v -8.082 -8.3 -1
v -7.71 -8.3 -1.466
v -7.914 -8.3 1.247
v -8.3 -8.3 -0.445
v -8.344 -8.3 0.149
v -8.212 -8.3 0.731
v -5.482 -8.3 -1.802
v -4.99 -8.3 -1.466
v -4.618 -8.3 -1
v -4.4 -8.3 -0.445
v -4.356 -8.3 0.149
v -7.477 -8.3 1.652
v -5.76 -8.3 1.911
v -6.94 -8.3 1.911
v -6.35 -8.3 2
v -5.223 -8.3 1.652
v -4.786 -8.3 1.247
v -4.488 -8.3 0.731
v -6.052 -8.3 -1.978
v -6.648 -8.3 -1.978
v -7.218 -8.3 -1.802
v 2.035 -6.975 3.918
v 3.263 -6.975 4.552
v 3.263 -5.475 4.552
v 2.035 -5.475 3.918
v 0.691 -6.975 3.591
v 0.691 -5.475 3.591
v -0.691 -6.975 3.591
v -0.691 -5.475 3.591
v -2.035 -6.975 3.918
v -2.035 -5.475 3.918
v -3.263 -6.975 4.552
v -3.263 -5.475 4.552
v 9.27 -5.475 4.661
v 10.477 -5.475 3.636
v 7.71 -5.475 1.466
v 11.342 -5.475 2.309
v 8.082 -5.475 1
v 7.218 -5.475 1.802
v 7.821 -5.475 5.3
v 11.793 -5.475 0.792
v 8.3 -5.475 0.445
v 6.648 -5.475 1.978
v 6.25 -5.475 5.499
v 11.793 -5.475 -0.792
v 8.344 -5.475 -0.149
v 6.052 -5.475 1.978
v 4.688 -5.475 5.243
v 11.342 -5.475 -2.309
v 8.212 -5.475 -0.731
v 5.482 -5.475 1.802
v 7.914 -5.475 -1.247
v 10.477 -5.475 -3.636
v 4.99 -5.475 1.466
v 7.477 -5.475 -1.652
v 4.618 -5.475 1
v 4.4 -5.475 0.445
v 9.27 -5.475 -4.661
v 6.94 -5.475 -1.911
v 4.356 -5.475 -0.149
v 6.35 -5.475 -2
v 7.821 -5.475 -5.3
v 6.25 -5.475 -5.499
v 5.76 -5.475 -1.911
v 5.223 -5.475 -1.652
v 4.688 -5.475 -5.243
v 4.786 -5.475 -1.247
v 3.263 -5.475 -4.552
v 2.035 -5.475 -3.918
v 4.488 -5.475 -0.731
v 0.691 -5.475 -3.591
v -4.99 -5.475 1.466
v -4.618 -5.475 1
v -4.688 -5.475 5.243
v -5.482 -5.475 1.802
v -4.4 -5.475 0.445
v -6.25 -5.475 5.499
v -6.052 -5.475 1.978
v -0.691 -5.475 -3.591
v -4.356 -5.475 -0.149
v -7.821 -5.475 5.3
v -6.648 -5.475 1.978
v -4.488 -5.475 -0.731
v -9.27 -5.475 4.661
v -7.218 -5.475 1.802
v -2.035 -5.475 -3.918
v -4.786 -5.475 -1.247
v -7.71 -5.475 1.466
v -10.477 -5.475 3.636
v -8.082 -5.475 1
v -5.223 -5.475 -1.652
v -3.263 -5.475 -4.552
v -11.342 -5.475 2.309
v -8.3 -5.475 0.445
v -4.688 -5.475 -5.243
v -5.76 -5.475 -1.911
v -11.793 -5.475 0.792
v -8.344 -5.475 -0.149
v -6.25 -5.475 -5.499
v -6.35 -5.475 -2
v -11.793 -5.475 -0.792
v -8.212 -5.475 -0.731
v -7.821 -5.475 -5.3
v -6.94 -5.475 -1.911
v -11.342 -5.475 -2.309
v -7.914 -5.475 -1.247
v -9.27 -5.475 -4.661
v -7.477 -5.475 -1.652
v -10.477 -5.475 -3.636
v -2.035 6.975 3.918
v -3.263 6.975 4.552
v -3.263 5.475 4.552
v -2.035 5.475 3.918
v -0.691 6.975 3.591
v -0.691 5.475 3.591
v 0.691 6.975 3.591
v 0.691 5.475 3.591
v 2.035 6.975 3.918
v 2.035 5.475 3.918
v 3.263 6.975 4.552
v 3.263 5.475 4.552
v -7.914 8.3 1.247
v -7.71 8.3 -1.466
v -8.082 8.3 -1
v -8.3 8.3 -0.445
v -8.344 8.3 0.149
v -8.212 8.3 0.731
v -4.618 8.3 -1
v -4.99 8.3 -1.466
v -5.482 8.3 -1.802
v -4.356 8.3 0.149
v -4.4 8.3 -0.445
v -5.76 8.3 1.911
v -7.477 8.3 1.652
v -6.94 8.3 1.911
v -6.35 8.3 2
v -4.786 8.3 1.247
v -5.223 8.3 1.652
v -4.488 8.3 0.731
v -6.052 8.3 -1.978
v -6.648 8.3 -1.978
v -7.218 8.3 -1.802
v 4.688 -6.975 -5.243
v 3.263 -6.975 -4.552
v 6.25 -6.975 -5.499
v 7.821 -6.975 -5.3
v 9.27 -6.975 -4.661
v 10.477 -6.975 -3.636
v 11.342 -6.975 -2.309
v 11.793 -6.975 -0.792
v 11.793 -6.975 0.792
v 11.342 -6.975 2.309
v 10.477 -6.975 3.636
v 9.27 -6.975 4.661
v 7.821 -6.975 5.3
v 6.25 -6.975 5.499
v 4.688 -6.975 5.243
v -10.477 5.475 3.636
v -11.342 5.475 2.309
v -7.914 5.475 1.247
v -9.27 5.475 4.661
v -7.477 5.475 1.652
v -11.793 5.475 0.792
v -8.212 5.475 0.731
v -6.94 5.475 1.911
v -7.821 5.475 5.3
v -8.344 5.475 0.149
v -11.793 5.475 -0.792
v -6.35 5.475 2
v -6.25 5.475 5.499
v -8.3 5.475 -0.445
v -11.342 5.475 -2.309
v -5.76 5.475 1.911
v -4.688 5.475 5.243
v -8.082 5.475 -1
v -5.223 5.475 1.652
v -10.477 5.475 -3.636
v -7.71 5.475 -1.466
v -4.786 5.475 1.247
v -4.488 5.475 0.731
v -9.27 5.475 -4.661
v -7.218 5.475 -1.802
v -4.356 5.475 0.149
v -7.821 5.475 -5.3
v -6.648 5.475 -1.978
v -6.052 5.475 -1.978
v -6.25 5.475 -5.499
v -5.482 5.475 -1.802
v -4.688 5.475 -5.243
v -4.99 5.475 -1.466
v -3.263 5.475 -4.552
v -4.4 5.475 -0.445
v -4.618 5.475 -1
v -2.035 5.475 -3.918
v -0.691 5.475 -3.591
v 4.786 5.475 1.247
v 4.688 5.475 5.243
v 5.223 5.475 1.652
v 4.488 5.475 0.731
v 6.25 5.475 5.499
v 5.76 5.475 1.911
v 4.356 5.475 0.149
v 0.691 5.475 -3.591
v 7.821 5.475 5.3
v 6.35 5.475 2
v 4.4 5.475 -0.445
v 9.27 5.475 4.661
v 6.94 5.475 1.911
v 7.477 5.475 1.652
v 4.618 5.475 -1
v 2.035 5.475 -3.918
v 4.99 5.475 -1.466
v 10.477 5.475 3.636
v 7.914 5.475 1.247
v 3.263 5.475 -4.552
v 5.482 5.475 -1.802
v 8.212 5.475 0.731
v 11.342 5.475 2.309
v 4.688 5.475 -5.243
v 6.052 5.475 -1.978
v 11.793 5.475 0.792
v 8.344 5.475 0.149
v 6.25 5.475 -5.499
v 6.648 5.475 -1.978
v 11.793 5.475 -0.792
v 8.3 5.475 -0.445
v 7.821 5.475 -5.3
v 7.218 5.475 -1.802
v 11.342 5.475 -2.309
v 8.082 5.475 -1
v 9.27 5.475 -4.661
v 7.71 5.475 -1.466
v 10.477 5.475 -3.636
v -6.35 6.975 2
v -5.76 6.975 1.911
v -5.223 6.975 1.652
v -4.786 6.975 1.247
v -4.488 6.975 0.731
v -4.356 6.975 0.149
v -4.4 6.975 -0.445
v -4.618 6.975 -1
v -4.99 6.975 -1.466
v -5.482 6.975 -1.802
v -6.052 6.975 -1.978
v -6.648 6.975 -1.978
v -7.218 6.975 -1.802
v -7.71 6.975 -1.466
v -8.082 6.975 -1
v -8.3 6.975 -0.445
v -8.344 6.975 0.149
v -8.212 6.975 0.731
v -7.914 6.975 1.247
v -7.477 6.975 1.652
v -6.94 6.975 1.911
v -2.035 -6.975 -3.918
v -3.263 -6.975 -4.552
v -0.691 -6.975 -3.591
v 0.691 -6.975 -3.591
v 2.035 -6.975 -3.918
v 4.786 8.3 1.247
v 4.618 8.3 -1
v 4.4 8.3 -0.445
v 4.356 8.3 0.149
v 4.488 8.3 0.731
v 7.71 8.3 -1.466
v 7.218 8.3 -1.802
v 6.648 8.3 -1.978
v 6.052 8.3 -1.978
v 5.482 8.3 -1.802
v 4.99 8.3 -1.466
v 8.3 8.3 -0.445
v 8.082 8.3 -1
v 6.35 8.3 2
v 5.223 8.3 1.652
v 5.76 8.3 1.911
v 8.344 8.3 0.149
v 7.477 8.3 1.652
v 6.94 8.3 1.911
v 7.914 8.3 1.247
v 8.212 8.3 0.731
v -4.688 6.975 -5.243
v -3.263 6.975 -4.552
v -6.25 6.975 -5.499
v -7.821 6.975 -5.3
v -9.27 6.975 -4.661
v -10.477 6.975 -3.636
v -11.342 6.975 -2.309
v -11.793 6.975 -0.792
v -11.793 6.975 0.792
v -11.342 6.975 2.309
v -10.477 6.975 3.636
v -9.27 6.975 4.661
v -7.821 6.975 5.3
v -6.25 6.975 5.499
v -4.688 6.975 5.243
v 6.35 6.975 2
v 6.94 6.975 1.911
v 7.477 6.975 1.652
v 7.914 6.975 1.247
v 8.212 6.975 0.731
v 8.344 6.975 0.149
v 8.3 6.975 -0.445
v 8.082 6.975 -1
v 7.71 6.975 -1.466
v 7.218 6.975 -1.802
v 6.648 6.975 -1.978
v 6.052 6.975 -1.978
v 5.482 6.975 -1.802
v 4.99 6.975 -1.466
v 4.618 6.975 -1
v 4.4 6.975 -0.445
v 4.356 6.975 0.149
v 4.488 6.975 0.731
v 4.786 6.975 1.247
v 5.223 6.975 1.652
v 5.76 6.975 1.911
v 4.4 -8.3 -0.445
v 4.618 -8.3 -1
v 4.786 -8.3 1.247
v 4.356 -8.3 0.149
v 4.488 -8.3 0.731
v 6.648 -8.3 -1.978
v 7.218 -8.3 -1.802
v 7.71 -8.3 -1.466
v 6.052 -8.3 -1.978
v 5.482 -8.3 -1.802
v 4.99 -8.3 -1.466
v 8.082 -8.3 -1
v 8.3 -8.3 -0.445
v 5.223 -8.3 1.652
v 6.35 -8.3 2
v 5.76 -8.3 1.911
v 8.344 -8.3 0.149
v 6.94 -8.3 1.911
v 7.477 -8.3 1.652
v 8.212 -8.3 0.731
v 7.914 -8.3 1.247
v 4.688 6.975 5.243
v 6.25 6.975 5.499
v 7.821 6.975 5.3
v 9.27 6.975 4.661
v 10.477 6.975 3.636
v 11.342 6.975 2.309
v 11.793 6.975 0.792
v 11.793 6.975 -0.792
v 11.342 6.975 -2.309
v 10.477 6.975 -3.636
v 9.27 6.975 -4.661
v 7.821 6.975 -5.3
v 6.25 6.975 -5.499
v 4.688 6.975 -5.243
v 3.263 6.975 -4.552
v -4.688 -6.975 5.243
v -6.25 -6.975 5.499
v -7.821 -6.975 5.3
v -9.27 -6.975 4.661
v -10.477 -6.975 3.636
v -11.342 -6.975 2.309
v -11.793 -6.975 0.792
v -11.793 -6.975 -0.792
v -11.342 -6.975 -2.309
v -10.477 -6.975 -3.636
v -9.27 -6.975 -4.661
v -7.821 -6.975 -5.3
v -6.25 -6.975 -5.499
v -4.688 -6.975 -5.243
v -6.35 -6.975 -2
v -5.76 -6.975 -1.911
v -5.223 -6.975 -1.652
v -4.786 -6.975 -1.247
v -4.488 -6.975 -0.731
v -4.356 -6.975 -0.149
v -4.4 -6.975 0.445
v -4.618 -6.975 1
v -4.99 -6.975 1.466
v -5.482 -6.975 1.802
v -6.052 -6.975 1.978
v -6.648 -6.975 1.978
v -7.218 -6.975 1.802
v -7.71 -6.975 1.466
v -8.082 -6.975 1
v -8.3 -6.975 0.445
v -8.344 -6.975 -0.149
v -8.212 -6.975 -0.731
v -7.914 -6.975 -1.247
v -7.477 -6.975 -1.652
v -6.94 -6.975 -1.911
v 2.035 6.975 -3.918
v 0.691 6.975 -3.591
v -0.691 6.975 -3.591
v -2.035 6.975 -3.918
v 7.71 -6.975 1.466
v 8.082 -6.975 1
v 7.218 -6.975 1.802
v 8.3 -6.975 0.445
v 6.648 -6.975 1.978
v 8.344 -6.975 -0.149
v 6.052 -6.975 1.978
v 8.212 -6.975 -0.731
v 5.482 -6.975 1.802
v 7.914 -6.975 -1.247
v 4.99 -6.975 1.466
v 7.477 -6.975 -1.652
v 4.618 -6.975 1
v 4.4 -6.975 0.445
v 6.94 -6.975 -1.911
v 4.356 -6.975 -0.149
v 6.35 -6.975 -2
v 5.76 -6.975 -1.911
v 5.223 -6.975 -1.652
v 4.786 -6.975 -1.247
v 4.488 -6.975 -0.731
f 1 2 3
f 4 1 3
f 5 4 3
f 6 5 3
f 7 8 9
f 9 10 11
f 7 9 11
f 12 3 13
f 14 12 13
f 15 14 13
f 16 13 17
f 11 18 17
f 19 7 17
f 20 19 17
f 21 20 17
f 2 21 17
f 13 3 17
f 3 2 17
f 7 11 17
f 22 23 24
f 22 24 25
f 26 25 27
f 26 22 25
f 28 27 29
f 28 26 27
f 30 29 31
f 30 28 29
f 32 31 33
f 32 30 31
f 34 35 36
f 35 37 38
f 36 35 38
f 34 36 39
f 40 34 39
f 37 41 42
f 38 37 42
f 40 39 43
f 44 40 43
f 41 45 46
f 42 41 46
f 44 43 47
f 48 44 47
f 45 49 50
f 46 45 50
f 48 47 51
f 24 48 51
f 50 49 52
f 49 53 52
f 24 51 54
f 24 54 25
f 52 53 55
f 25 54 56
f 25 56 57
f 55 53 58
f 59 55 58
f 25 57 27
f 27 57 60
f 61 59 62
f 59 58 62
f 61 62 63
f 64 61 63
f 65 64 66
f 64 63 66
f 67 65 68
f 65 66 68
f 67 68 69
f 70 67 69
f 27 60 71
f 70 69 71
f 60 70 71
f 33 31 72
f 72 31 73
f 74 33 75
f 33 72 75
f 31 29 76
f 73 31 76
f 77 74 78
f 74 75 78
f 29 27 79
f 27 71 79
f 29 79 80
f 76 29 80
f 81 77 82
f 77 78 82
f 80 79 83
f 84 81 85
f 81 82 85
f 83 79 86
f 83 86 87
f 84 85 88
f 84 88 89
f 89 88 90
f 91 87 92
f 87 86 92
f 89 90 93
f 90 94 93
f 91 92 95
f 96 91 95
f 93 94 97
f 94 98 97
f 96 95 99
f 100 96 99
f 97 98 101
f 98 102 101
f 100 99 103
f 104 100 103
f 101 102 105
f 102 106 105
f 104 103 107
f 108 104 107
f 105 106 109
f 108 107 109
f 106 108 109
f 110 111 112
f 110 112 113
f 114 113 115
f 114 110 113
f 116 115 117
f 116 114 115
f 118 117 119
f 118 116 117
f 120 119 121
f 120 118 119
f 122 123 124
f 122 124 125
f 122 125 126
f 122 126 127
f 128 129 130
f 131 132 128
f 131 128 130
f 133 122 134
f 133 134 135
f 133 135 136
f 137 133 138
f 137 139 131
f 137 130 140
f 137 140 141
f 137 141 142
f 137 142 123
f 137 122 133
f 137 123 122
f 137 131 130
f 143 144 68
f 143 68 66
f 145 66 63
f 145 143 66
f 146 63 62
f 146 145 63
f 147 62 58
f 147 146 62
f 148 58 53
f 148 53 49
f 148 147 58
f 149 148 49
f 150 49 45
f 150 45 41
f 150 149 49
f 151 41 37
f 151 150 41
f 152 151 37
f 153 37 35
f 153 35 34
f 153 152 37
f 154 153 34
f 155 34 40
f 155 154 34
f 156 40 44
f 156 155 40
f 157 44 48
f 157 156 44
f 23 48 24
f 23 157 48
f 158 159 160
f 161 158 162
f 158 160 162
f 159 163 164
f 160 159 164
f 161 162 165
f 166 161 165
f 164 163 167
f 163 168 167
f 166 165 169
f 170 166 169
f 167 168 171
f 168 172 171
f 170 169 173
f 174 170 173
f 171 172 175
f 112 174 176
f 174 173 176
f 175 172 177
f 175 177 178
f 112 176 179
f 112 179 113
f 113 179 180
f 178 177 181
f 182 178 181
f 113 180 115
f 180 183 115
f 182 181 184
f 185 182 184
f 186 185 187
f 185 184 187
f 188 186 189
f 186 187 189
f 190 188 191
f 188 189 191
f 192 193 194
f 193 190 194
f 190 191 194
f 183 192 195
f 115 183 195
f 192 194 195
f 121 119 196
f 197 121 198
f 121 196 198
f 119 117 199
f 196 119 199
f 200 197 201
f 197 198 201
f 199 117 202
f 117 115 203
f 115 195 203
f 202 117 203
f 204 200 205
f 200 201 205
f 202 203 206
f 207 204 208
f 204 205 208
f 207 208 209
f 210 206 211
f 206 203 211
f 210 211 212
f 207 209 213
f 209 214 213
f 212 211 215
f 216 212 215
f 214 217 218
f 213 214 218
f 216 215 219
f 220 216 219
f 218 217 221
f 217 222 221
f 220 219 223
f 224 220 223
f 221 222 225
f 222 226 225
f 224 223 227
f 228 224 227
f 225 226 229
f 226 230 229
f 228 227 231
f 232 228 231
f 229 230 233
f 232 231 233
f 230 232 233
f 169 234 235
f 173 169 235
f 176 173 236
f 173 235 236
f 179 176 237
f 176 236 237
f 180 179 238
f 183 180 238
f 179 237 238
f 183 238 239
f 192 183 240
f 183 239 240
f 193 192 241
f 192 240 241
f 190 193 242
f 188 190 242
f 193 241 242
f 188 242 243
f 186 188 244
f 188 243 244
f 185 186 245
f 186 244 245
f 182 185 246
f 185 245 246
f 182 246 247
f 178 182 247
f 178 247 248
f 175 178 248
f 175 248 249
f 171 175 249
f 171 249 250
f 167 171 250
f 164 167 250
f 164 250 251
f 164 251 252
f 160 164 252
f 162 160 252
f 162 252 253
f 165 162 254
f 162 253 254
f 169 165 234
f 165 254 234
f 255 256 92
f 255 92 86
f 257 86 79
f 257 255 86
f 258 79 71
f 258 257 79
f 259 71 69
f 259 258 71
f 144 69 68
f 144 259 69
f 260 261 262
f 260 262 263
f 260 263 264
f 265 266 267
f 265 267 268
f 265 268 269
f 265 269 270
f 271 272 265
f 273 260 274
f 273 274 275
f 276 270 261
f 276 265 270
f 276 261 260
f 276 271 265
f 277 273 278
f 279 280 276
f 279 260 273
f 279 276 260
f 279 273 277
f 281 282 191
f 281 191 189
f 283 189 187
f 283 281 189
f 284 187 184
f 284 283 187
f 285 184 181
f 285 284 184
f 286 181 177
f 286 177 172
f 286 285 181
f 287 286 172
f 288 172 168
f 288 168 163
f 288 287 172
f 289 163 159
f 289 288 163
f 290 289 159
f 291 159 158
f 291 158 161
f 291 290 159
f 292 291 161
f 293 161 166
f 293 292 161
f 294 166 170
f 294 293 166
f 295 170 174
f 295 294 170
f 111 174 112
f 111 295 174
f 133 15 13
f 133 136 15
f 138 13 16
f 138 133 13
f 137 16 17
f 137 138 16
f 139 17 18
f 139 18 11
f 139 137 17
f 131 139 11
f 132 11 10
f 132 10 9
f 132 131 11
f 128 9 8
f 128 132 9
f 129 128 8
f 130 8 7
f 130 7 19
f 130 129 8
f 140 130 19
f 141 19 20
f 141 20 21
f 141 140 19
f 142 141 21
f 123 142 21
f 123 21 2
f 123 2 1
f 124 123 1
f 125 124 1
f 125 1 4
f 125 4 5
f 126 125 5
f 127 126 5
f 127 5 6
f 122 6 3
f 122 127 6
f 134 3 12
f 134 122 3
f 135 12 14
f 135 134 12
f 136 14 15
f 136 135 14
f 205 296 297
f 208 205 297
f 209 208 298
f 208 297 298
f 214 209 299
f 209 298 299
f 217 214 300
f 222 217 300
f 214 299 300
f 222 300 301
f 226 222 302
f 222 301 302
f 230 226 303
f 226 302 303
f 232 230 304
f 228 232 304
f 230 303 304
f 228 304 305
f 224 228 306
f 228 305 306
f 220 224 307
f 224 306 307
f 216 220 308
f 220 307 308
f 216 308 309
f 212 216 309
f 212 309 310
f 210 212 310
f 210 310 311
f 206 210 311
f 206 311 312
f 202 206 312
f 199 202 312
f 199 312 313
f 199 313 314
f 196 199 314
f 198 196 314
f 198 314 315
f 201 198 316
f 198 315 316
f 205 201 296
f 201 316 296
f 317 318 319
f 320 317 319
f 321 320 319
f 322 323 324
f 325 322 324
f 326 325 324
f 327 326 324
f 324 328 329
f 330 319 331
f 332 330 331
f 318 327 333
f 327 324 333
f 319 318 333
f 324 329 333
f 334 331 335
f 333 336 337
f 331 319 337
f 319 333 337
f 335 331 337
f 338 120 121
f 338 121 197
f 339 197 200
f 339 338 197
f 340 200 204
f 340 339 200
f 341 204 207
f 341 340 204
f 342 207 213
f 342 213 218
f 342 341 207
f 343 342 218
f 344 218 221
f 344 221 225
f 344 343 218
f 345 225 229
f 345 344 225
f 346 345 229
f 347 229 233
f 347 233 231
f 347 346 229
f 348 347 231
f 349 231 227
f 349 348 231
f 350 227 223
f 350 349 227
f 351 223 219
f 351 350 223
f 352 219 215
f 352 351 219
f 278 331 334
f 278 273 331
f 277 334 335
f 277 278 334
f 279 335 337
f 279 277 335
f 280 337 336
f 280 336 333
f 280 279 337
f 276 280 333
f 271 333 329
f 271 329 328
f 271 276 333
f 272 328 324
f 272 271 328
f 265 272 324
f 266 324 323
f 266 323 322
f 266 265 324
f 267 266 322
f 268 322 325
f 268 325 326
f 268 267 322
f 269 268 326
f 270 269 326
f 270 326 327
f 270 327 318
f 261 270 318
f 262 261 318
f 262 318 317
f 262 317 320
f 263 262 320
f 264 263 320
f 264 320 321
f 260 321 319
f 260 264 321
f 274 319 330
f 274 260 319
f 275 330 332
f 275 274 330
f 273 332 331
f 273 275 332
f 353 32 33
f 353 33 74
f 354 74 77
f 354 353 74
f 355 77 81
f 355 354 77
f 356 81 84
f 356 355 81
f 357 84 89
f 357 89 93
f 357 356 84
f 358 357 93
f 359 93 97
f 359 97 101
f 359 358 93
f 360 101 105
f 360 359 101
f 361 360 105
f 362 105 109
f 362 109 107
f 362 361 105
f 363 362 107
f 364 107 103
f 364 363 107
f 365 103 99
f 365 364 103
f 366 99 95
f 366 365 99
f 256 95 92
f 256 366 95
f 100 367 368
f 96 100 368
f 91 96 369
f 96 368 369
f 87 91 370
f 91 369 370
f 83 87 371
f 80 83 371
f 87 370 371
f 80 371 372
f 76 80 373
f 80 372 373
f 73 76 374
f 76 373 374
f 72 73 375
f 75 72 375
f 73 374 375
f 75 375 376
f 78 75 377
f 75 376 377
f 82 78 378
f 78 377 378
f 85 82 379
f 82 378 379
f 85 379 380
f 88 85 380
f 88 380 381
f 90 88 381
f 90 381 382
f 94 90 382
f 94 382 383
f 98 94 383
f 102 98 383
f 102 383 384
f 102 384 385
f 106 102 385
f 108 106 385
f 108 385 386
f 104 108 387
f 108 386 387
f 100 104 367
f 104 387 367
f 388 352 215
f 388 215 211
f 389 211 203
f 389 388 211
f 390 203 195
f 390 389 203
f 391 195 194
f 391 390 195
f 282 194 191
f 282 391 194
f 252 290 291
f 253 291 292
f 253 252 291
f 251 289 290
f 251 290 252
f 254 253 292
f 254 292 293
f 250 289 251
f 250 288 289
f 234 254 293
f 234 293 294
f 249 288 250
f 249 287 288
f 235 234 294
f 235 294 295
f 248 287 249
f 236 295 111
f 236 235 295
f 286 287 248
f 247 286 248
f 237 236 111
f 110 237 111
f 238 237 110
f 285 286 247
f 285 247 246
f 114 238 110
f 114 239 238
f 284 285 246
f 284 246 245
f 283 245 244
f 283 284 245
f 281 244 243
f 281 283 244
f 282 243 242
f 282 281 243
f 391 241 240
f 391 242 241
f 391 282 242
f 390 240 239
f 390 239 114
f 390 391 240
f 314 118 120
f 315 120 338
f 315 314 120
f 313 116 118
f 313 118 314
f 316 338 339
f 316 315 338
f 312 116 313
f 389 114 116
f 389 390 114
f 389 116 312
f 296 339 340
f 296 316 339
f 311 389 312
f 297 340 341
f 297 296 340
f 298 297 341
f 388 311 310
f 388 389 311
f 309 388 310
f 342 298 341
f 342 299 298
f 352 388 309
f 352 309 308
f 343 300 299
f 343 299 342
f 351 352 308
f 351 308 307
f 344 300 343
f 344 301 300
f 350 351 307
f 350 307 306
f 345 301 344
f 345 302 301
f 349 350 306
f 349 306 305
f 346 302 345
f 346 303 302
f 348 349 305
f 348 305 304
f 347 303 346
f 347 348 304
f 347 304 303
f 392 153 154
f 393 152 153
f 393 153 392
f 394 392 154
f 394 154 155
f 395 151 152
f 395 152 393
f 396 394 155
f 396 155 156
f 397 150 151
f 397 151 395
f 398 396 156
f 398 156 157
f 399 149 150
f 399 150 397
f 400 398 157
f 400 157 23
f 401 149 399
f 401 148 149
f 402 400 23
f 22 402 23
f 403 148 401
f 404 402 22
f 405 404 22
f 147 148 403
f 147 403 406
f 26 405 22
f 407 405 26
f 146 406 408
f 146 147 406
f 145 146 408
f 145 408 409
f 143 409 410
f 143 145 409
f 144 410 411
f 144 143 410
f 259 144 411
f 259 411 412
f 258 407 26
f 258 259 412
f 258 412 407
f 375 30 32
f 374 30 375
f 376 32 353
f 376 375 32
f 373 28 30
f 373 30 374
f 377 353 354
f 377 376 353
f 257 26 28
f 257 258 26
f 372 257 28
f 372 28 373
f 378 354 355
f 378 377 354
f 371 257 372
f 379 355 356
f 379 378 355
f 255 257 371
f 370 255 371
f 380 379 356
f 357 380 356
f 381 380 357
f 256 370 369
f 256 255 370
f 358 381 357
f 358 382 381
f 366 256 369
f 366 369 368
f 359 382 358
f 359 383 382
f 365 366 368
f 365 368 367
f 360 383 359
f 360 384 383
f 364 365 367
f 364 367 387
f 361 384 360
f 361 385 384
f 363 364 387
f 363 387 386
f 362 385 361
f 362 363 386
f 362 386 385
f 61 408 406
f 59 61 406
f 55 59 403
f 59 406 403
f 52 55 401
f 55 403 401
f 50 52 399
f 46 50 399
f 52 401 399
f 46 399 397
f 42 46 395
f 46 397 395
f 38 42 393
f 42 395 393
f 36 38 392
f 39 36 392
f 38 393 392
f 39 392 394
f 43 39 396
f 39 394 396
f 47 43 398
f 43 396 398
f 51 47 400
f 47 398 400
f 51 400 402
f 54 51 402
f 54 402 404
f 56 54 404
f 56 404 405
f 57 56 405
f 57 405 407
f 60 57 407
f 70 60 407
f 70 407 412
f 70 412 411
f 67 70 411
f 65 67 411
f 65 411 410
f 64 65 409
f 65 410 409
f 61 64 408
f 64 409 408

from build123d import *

# Parameters (mm, degrees)
ESBO_O5_R                = 2
RESSALTO_EXTRUS_O1_DEPTH = 1.5
ESBO_O10_R               = 2
RESSALTO_EXTRUS_O2_DEPTH = 1.5
ESBO_O16_W               = 2
ESBO_O16_H               = 16.6
ESBO_O23_W               = 2
ESBO_O23_H               = 16.6


with BuildPart() as part:
    # Esboço5 → Ressalto-extrusão1 (new body)
    with BuildSketch(Plane(origin=(0, 6.975, 0), x_dir=(1, 0, 0), z_dir=(0, 1, 0))):
        with BuildLine():
            ThreePointArc((3.263144476, 4.552067989), (0, 3.55), (-3.263144476, 4.552067989))
            ThreePointArc((-3.263144476, 4.552067989), (-11.85, 0), (-3.263144476, -4.552067989))
            ThreePointArc((-3.263144476, -4.552067989), (0, -3.55), (3.263144476, -4.552067989))
            ThreePointArc((3.263144476, -4.552067989), (11.85, 0), (3.263144476, 4.552067989))
        make_face()
        with Locations(Location((6.35, 0, 0), (0, 0, 270))):
            Circle(ESBO_O5_R, mode=Mode.SUBTRACT)
        with Locations(Location((-6.35, 0, 0), (0, 0, 270))):
            Circle(ESBO_O5_R, mode=Mode.SUBTRACT)
    extrude(amount=-RESSALTO_EXTRUS_O1_DEPTH)


with BuildPart() as body_2:
    # Esboço10 → Ressalto-extrusão2 (new body)
    with BuildSketch(Plane(origin=(0, -6.975, 0), x_dir=(-1, 0, 0), z_dir=(0, -1, 0))):
        with BuildLine():
            ThreePointArc((3.263144476, 4.552067989), (0, 3.55), (-3.263144476, 4.552067989))
            ThreePointArc((-3.263144476, 4.552067989), (-11.85, 0), (-3.263144476, -4.552067989))
            ThreePointArc((-3.263144476, -4.552067989), (0, -3.55), (3.263144476, -4.552067989))
            ThreePointArc((3.263144476, -4.552067989), (11.85, 0), (3.263144476, 4.552067989))
        make_face()
        with Locations(Location((-6.35, 0, 0), (0, 0, 90))):
            Circle(ESBO_O10_R, mode=Mode.SUBTRACT)
        with Locations(Location((6.35, 0, 0), (0, 0, 90))):
            Circle(ESBO_O10_R, mode=Mode.SUBTRACT)
    extrude(amount=-RESSALTO_EXTRUS_O2_DEPTH)


with BuildPart() as body_3:
    # Esboço16 → Revolução2 (revolve)
    with BuildSketch(Plane(origin=(0, 0, 0), x_dir=(-1, 0, 0), z_dir=(0, 0, -1)), mode=Mode.PRIVATE) as revolu_o2_sk:
        with Locations((5.35, 0)):
            Rectangle(ESBO_O16_W, ESBO_O16_H)
    revolve(revolu_o2_sk.sketch.rotate(Axis((-6.35, -8.3, 0), (0, 1, 0)), 270), axis=Axis((-6.35, -8.3, 0), (0, 1, 0)))


with BuildPart() as body_4:
    # Esboço23 → Revolução3 (revolve)
    with BuildSketch(Plane(origin=(0, 0, 0), x_dir=(-1, 0, 0), z_dir=(0, 0, -1)), mode=Mode.PRIVATE) as revolu_o3_sk:
        with Locations((-7.35, 0)):
            Rectangle(ESBO_O23_W, ESBO_O23_H)
    revolve(revolu_o3_sk.sketch.rotate(Axis((6.35, -8.3, 0), (0, 1, 0)), 270), axis=Axis((6.35, -8.3, 0), (0, 1, 0)))


solid = Compound([part.part, body_2.part, body_3.part, body_4.part])
